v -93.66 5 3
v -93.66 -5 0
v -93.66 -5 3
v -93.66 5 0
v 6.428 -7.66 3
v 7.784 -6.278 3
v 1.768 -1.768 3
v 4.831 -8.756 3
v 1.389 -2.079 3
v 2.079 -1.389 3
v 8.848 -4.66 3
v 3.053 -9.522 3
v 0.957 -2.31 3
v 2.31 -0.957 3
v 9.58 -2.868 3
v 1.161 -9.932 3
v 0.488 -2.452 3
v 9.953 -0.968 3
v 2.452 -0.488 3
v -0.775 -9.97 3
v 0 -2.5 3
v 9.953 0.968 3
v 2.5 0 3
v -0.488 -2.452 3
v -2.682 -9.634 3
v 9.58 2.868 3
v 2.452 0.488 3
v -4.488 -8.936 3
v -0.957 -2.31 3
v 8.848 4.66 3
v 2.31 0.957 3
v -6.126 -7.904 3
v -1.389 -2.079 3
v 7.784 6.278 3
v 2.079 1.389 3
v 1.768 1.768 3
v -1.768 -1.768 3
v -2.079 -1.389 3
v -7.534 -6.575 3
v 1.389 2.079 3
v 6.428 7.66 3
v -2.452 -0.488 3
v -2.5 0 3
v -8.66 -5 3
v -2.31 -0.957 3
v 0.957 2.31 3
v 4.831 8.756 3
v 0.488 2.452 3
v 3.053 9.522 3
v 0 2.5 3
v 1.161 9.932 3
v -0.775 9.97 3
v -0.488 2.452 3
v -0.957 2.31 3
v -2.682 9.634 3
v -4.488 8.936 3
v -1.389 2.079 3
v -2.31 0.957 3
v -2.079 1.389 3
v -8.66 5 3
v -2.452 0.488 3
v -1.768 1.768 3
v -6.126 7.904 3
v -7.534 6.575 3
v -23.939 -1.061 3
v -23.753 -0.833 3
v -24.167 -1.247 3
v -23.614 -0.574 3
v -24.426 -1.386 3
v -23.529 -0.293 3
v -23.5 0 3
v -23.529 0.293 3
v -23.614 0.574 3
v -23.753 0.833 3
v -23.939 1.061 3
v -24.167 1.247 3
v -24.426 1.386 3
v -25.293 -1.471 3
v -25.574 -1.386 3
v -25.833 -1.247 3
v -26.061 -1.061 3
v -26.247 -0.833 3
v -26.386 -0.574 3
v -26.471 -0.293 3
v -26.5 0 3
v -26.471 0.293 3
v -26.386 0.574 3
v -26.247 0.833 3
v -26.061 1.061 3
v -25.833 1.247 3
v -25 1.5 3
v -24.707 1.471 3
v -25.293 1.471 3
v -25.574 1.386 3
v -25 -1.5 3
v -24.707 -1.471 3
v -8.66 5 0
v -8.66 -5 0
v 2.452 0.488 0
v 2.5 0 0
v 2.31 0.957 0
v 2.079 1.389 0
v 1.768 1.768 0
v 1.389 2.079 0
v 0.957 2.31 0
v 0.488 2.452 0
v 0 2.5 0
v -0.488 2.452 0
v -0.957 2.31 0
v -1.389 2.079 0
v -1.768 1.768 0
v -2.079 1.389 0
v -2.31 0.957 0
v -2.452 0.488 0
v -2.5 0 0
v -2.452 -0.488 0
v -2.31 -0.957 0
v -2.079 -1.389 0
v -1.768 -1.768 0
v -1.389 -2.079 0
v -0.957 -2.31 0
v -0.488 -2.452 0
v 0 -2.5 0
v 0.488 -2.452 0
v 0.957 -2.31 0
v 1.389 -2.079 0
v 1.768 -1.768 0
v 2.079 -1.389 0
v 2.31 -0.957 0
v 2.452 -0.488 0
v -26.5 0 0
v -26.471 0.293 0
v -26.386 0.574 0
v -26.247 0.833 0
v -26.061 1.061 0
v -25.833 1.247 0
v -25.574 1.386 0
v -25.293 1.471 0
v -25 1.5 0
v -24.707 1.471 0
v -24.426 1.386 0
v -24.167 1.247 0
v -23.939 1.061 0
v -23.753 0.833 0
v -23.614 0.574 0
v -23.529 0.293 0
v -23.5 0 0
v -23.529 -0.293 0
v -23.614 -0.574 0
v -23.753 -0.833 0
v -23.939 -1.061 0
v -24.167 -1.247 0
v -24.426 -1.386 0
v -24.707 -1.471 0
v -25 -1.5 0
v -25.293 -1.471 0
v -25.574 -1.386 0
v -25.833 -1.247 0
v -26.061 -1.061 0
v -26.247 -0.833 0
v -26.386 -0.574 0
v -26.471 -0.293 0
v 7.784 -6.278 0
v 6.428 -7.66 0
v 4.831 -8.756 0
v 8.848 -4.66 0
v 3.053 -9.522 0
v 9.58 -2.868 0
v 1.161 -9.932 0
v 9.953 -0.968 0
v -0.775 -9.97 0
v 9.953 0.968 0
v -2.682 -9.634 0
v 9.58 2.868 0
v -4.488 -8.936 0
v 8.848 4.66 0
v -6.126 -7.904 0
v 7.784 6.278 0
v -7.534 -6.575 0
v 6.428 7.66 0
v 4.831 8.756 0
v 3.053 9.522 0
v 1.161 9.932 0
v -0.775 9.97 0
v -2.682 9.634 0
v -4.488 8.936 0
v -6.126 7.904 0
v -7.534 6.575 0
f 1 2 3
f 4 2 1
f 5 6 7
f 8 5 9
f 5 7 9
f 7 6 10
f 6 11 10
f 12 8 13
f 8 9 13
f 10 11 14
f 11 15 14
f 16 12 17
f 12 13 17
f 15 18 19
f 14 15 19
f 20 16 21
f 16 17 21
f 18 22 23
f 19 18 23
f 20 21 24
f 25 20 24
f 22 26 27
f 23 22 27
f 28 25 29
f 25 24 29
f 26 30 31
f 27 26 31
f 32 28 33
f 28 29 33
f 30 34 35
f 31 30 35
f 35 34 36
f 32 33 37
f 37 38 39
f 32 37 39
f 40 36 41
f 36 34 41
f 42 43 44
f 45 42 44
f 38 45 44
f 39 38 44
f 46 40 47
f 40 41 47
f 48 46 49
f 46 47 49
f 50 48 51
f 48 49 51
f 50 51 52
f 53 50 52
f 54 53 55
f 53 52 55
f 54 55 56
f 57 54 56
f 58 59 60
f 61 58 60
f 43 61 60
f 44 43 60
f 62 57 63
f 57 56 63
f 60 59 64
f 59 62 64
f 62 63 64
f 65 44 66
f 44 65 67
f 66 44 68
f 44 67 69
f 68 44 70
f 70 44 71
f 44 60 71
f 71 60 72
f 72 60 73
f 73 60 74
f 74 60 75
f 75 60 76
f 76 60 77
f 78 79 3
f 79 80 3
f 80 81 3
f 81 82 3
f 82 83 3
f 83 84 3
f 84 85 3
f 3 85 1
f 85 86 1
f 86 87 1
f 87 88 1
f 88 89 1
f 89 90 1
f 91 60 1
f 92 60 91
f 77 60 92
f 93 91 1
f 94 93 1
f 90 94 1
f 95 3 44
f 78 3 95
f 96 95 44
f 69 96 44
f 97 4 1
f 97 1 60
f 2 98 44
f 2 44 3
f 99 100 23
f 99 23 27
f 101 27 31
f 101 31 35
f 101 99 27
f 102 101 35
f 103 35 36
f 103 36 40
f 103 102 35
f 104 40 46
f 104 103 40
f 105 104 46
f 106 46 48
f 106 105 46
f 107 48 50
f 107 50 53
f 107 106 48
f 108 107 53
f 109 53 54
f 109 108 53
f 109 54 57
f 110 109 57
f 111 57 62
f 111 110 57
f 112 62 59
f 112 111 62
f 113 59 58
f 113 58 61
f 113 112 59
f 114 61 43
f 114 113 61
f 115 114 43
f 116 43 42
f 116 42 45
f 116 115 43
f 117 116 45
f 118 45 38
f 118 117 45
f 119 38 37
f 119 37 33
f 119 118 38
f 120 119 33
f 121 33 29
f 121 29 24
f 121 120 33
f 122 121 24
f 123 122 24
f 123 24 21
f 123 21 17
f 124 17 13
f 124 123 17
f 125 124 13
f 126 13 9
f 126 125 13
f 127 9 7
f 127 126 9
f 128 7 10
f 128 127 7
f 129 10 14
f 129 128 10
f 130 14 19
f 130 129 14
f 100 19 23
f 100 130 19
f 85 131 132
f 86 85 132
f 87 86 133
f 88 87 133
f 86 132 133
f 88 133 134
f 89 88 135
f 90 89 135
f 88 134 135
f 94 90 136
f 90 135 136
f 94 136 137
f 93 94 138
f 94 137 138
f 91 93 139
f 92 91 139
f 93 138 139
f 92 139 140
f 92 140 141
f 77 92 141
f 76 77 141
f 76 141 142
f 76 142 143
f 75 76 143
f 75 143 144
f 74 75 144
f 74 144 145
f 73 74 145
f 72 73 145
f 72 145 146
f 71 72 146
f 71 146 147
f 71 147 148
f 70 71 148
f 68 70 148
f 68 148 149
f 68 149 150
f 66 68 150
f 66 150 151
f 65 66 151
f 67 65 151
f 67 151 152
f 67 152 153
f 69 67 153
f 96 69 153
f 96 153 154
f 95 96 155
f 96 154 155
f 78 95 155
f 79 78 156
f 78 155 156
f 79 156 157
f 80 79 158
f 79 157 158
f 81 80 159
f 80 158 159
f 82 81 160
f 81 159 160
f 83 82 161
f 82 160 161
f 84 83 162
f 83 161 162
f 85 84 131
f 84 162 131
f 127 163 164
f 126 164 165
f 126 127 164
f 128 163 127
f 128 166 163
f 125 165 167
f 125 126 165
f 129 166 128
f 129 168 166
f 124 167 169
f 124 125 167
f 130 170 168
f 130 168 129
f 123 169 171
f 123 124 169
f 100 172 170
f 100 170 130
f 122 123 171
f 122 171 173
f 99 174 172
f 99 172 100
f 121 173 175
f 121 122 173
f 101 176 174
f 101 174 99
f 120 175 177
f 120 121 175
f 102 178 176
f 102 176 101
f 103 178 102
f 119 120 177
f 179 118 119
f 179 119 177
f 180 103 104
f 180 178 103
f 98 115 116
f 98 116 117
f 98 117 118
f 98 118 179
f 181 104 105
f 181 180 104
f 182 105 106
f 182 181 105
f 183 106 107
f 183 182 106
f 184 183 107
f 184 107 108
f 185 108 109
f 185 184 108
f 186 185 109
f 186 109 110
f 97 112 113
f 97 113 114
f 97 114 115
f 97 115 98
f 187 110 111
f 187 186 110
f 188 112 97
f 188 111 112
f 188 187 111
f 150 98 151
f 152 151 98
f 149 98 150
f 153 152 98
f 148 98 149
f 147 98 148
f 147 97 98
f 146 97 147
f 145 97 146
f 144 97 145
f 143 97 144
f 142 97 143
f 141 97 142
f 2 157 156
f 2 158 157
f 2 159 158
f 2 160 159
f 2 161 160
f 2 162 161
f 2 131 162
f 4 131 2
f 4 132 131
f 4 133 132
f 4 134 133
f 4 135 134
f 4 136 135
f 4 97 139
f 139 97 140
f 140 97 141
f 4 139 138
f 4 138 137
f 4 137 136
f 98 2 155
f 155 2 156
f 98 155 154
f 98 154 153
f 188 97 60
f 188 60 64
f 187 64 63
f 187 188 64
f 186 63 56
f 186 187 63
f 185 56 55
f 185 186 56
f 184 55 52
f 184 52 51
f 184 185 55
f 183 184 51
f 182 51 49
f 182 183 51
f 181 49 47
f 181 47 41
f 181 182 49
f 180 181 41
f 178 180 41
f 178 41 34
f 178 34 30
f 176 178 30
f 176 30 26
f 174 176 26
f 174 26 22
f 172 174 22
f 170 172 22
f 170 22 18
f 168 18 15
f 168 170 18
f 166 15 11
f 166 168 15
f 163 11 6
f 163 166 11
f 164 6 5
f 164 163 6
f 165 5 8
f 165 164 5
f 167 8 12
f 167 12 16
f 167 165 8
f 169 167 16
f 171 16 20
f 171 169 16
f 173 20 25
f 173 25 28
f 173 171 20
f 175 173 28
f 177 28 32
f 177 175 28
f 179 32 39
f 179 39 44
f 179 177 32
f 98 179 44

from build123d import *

# Parameters (mm, degrees)
SKETCH1_R           = 2.5
BOSS_EXTRUDE1_DEPTH = 3
SKETCH2_R           = 1.5
CUT_EXTRUDE1_DEPTH  = 10


with BuildPart() as part:
    # Sketch1 → Boss-Extrude1 (new body)
    with BuildSketch(Plane.XY):
        with BuildLine():
            Line((-93.660254038, 5), (-8.660254038, 5))
            ThreePointArc((-8.660254038, 5), (10, 0), (-8.660254038, -5))
            Line((-8.660254038, -5), (-93.660254038, -5))
            Line((-93.660254038, -5), (-93.660254038, 5))
        make_face()
        Circle(SKETCH1_R, mode=Mode.SUBTRACT)
    extrude(amount=BOSS_EXTRUDE1_DEPTH)

    # Sketch2 → Cut-Extrude1 (cut)
    with BuildSketch(Plane(origin=(0, 0, 0), x_dir=(-1, 0, 0), z_dir=(0, 0, -1))):
        with Locations((25, 0)):
            Circle(SKETCH2_R)
    extrude(amount=-CUT_EXTRUDE1_DEPTH, mode=Mode.SUBTRACT)


solid = part.part
